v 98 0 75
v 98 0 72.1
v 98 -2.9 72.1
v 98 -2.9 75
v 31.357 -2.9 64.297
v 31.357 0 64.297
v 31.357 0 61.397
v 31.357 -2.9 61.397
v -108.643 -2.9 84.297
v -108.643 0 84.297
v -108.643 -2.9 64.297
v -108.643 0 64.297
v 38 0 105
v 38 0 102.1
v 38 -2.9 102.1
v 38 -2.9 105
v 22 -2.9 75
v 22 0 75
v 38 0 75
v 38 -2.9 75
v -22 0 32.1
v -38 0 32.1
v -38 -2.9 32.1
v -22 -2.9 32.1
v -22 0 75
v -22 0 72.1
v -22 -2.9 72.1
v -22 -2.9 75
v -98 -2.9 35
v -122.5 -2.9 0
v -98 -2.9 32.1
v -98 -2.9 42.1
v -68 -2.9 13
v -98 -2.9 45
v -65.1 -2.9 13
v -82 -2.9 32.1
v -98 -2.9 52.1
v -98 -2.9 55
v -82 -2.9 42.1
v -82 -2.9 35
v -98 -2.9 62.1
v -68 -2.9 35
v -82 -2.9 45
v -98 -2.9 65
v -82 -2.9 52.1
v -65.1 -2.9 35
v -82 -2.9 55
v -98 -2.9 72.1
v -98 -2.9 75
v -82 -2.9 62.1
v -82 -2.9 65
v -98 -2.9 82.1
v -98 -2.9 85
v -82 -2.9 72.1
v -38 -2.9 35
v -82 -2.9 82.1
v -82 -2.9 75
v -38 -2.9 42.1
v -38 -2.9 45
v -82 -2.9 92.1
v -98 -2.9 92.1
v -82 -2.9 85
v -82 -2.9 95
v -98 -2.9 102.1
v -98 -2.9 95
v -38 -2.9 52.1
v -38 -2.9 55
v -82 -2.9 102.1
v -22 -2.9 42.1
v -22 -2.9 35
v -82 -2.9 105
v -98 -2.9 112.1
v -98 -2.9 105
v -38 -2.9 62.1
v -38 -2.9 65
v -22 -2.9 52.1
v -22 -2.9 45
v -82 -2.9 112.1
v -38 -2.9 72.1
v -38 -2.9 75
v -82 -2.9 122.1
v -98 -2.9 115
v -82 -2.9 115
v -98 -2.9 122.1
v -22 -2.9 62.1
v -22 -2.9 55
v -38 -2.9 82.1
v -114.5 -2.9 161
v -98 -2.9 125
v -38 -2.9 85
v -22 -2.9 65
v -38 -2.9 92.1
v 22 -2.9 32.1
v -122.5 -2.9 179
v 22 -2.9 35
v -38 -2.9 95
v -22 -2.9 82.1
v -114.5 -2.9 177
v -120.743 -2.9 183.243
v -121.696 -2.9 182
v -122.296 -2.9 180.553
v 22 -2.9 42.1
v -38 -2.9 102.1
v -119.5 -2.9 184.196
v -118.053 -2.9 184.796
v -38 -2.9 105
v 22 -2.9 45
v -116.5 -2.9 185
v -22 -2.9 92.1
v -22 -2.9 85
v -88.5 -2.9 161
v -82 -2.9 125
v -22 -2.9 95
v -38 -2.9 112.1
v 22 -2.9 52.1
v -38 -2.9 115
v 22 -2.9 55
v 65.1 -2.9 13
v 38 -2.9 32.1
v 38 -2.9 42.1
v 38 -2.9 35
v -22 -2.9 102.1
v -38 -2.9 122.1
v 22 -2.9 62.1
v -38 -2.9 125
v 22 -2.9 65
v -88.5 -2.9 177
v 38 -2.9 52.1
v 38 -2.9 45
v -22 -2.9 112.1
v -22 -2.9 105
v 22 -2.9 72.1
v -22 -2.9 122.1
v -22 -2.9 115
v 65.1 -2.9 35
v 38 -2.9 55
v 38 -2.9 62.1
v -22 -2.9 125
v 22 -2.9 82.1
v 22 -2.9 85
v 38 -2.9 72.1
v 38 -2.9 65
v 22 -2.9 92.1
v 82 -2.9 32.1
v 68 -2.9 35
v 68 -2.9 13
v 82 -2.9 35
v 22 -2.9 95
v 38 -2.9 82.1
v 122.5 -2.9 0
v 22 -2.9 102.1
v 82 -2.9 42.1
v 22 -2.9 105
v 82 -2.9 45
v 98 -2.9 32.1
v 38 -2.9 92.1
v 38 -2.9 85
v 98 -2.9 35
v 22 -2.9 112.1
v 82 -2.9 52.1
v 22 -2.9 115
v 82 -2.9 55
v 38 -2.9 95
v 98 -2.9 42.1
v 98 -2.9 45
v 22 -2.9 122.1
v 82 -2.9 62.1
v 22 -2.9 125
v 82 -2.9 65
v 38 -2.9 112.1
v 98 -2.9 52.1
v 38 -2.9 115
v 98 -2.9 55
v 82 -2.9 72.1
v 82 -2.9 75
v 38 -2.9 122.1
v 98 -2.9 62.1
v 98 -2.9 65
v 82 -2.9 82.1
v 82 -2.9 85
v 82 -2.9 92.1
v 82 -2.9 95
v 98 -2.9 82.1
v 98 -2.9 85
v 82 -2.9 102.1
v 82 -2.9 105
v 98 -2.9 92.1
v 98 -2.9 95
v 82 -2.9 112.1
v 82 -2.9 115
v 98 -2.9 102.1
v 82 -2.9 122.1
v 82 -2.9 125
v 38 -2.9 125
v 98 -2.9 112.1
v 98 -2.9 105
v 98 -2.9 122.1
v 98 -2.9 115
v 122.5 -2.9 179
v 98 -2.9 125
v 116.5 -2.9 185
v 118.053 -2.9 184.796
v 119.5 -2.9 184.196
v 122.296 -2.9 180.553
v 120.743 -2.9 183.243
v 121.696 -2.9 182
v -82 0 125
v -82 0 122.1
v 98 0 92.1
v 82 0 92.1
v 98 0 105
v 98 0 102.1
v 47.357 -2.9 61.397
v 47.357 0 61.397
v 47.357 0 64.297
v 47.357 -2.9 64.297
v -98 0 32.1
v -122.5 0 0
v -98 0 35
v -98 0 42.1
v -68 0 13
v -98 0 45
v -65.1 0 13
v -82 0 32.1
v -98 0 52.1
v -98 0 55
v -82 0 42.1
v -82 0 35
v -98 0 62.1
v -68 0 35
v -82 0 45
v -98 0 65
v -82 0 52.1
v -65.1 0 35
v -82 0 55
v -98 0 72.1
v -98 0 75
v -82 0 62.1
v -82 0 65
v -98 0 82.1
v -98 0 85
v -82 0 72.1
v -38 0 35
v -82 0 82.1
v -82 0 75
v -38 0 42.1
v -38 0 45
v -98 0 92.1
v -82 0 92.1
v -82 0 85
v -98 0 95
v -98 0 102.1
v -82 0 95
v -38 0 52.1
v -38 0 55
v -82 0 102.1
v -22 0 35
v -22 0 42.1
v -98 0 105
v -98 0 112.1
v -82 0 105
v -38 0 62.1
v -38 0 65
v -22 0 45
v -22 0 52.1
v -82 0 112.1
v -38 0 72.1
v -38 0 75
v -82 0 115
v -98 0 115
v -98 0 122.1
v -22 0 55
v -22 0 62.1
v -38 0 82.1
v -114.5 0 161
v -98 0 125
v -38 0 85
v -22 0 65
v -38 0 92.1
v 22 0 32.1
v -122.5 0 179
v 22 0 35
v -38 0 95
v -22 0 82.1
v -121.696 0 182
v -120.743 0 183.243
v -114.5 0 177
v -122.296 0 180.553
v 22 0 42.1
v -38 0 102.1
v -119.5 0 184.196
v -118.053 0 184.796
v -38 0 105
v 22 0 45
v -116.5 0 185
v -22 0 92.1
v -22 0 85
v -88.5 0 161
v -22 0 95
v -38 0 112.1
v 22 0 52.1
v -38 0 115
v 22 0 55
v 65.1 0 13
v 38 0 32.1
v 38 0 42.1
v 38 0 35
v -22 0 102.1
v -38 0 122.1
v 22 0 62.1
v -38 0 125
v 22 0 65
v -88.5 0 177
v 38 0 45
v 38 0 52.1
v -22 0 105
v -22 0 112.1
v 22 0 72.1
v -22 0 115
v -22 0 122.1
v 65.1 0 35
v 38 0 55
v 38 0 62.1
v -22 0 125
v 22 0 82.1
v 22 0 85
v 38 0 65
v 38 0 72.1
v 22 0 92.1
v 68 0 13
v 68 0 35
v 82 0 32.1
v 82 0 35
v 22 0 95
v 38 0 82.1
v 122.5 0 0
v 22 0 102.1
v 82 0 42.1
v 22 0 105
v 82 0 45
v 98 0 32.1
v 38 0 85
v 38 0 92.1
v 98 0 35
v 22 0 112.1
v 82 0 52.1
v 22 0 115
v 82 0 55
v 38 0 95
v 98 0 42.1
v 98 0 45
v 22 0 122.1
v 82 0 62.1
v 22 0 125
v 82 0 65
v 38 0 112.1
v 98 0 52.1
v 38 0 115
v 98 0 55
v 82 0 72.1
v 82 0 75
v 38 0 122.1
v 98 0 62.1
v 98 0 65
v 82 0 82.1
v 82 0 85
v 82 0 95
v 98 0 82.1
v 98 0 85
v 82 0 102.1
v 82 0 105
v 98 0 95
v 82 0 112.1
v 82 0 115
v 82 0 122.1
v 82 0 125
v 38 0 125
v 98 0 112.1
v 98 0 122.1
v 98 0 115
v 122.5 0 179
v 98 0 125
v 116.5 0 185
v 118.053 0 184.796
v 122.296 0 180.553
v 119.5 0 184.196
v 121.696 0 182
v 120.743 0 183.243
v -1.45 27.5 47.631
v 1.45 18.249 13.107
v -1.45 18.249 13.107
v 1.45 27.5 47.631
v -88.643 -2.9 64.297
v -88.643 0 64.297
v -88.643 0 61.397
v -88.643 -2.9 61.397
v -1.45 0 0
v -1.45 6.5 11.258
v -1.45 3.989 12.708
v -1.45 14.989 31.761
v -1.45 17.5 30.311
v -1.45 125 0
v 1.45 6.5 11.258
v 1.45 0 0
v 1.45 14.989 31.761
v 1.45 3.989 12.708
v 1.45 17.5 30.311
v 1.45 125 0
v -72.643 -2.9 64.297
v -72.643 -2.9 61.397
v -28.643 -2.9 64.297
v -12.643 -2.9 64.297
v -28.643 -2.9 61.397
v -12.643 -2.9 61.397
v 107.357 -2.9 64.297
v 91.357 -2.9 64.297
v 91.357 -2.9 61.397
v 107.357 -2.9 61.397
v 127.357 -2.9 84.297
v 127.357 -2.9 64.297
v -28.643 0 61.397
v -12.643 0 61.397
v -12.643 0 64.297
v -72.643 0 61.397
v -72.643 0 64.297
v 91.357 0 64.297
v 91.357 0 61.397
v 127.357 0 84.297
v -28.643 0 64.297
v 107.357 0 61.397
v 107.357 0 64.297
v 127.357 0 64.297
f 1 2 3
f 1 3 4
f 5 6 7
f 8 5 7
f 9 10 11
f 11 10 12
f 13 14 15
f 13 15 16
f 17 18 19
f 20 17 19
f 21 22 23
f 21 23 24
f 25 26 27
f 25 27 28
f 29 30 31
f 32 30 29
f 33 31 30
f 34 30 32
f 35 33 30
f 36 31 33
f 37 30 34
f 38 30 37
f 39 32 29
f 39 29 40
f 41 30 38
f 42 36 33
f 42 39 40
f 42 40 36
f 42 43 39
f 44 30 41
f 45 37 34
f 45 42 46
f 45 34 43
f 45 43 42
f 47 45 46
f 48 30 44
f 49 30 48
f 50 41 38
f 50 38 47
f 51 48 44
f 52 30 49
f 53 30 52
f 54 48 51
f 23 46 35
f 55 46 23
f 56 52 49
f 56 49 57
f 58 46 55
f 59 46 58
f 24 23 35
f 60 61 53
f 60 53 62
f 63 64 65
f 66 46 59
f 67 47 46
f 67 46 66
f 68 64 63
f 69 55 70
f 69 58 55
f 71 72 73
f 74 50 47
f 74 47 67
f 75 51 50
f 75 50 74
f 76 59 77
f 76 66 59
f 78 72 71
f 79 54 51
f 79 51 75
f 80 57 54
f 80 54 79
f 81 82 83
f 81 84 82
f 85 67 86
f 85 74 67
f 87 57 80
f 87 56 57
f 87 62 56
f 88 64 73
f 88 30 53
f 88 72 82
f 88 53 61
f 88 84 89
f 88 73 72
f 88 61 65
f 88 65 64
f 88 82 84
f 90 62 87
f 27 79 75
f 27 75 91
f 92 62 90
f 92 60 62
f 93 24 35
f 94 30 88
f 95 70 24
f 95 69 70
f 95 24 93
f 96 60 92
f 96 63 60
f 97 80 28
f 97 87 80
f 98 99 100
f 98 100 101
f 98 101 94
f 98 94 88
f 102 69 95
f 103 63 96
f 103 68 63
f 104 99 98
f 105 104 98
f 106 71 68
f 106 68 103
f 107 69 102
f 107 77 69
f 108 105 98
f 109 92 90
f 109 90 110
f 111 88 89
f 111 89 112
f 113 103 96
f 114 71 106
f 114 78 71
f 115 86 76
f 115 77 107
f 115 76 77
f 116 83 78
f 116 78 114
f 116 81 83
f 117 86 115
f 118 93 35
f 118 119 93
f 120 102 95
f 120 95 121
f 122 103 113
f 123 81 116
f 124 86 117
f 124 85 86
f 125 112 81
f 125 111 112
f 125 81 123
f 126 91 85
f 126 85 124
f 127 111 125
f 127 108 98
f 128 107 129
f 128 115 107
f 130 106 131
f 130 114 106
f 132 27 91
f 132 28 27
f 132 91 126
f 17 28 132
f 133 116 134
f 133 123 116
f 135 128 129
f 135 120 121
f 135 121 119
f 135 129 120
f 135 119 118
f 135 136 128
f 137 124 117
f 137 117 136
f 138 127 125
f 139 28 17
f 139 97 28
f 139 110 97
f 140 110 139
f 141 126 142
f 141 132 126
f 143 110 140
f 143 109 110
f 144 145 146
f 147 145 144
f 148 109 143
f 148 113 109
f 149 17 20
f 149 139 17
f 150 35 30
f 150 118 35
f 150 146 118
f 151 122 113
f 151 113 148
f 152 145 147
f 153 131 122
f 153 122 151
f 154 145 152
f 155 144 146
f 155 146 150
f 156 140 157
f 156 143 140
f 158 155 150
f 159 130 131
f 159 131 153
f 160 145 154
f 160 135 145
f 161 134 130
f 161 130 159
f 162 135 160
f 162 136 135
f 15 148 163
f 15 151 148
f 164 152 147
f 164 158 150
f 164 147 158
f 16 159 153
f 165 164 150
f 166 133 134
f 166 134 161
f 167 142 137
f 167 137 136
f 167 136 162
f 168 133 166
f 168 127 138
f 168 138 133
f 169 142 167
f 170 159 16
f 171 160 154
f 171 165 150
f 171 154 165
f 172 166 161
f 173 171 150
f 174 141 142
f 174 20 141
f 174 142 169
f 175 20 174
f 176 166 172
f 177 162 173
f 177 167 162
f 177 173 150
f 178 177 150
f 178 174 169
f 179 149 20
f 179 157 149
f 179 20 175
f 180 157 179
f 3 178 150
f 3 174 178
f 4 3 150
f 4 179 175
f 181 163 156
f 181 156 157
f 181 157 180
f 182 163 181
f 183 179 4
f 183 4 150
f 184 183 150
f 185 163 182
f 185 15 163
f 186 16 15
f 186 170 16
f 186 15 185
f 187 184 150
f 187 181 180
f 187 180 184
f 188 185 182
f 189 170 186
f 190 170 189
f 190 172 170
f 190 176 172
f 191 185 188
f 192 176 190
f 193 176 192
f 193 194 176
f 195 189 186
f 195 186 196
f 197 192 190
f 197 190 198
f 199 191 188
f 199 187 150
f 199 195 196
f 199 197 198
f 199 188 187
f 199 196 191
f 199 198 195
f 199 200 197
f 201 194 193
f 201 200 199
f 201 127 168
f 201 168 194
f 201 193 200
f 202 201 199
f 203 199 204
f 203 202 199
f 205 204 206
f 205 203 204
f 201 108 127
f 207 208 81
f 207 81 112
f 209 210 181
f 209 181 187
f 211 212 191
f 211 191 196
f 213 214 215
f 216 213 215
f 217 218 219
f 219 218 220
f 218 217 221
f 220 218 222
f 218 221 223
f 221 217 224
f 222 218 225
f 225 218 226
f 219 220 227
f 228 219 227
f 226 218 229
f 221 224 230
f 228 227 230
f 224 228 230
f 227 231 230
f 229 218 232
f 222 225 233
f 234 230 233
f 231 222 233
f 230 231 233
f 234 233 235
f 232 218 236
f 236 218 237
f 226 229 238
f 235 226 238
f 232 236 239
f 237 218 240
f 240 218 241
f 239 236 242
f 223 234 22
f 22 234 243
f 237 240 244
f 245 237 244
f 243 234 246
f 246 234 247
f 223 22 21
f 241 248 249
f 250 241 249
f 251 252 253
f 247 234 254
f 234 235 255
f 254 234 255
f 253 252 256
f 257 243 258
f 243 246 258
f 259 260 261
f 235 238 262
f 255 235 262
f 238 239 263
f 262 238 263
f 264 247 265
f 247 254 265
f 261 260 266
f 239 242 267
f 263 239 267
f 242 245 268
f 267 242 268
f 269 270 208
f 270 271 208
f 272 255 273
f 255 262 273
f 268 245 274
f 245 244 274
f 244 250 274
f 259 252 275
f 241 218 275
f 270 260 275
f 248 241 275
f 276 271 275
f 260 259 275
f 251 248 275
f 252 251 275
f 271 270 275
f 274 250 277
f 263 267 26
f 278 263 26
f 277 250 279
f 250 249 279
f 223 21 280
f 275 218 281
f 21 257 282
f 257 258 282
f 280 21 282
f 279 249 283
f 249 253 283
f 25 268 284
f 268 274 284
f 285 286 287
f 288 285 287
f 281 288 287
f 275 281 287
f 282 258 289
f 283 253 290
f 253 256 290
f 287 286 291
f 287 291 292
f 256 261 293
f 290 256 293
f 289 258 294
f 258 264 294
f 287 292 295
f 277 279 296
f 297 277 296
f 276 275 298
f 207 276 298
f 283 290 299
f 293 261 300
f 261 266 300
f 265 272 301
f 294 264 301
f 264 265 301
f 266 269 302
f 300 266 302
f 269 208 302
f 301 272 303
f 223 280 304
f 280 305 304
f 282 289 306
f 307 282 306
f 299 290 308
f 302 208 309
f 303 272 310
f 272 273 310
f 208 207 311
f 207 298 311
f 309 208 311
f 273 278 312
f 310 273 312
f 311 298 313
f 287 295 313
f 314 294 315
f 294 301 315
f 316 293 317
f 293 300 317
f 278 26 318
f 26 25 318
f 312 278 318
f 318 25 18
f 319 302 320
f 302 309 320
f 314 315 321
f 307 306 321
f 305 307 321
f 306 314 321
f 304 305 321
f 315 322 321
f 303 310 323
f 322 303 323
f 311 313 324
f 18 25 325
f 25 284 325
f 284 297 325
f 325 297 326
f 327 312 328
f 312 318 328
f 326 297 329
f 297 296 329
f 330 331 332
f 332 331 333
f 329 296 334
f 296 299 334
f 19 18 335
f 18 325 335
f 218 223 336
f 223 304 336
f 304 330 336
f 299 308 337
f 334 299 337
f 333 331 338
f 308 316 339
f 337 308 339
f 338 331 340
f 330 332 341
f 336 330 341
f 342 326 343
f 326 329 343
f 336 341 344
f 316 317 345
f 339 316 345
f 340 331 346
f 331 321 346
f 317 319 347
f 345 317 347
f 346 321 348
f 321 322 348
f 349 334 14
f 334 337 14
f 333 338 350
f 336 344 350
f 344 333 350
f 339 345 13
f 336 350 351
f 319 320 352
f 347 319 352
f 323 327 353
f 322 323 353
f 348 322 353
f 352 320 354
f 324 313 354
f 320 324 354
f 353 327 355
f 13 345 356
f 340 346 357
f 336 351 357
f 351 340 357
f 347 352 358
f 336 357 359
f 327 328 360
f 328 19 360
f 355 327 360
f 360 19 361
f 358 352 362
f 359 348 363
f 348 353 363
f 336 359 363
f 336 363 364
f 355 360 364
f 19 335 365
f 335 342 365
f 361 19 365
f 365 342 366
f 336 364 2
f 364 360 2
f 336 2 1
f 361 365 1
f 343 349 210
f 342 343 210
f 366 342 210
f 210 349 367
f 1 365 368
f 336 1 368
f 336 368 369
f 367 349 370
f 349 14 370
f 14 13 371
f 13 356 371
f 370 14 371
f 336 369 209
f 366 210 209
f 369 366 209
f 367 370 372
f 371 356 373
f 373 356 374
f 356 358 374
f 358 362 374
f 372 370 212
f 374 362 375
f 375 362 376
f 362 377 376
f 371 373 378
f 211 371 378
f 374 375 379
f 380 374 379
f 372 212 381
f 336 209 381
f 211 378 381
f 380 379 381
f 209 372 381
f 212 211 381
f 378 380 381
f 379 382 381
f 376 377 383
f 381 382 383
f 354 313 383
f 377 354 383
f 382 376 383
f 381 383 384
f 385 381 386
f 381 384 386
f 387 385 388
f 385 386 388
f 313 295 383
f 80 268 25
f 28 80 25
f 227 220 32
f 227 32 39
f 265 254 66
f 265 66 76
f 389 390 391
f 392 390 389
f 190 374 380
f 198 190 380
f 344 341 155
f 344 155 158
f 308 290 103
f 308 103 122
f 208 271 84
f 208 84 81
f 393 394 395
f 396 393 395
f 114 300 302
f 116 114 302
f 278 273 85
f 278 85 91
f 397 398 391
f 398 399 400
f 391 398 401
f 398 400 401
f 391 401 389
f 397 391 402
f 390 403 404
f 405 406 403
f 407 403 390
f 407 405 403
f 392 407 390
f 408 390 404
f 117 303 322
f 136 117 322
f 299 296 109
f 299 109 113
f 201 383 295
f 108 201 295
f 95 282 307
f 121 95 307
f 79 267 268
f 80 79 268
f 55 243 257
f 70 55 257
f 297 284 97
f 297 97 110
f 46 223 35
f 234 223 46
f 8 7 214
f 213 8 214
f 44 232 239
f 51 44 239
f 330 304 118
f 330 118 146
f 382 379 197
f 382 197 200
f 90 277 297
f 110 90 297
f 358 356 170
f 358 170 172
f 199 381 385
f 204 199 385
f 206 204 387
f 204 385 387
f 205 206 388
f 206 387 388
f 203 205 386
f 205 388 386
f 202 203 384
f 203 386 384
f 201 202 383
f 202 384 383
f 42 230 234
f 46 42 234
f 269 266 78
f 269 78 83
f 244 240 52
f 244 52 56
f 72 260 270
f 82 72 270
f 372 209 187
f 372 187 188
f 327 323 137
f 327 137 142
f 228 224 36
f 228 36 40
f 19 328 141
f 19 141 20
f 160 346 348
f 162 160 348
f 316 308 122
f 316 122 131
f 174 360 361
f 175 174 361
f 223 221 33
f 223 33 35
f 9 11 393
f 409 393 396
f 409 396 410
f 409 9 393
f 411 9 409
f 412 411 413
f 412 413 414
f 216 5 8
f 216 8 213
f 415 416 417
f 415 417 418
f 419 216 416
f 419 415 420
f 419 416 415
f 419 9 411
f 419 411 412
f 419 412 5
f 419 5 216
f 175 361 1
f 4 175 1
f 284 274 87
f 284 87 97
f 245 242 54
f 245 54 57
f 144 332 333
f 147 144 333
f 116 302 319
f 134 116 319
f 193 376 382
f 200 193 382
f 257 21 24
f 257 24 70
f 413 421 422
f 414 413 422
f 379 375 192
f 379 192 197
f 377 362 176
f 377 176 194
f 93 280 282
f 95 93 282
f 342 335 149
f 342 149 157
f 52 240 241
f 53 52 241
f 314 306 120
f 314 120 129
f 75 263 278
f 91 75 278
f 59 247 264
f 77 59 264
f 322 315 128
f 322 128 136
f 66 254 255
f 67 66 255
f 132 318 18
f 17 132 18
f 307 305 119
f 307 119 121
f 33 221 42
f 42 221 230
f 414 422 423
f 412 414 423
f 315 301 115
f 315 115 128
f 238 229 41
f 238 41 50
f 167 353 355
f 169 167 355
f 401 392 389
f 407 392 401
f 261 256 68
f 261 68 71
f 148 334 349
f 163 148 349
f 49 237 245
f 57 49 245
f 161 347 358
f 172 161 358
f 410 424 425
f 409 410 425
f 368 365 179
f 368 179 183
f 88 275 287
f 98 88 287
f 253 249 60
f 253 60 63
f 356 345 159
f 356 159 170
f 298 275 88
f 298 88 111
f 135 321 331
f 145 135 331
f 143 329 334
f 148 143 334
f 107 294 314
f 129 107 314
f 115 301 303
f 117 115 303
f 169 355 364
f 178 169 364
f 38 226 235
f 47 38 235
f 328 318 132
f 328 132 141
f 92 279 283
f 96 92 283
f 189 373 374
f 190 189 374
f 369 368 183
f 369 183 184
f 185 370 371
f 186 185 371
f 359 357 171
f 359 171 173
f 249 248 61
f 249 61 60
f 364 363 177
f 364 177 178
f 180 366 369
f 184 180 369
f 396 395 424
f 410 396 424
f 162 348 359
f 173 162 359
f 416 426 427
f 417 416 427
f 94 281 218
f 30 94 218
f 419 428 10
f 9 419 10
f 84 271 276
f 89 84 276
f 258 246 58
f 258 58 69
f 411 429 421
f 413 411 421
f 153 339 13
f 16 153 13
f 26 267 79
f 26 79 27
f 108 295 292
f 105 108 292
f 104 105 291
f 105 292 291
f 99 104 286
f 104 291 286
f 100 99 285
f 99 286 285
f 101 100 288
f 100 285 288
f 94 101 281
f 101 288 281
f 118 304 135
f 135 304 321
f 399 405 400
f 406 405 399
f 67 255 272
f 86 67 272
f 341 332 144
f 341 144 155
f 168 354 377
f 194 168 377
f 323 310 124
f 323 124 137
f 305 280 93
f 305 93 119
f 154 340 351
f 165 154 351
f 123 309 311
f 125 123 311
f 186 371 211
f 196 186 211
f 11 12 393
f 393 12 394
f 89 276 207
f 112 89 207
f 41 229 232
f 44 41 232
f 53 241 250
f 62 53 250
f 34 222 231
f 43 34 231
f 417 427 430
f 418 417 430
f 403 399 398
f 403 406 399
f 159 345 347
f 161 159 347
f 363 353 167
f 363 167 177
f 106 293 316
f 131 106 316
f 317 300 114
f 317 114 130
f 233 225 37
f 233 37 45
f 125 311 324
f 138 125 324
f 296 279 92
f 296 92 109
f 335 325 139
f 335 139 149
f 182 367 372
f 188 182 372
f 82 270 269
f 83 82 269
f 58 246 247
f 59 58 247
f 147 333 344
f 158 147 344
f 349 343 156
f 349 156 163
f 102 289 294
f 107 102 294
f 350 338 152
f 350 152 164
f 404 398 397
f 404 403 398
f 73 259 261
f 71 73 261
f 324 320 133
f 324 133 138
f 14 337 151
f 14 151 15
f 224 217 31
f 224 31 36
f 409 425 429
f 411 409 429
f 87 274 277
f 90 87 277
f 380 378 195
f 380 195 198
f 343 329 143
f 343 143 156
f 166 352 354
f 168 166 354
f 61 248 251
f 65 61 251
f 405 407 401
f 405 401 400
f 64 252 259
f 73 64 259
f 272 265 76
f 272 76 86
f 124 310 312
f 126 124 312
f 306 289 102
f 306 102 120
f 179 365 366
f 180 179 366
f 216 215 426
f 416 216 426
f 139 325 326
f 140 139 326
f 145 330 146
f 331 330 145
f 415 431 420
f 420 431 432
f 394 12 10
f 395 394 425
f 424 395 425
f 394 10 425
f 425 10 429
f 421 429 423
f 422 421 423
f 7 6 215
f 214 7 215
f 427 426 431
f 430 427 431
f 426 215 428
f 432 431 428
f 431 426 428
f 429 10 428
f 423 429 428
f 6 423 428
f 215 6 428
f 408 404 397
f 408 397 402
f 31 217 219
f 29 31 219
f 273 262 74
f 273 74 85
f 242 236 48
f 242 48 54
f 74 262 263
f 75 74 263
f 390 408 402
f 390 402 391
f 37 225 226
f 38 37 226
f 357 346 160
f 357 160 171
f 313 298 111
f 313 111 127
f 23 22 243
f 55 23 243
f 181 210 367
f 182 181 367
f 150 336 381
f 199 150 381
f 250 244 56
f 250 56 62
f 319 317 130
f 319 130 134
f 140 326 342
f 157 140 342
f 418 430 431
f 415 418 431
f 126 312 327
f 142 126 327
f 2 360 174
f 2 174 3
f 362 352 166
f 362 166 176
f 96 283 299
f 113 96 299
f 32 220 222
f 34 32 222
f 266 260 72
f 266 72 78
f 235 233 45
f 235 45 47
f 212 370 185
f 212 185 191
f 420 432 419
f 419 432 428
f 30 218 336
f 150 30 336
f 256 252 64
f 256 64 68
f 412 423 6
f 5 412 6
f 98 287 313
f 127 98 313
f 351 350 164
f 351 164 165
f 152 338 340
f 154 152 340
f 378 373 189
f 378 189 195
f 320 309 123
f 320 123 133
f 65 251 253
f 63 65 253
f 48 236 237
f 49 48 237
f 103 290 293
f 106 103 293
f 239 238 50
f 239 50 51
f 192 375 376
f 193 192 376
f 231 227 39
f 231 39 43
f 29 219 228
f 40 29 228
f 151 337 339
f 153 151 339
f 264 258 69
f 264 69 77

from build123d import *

# Parameters (mm, degrees)
F0_W     = 16
F0_H     = 2.9
F0_W_2   = 2.9
F0_H_2   = 22
F0_W_3   = 26
F0_H_3   = 16
F1_DEPTH = 2.9
F3_DEPTH = 1.45
F5_DEPTH = 2.9


# Not quite as in the source:
# - a feature names something its author has since deleted; it is built from what else it names


with BuildPart() as f1:
    # F0 (on Front) → F1 (new body)
    with BuildSketch(Plane.XZ):
        with BuildLine():
            Line((116.5, 185), (-116.5, 185))
            ThreePointArc((-116.5, 185), (-120.7426406871, 183.2426406871), (-122.5, 179))
            Line((-122.5, 179), (-122.5, 0))
            Line((-122.5, 0), (122.5, 0))
            Line((122.5, 0), (122.5, 179))
            ThreePointArc((122.5, 179), (120.7426406871, 183.2426406871), (116.5, 185))
        make_face()
        with Locations((-90, 33.55)):
            Rectangle(F0_W, F0_H, mode=Mode.SUBTRACT)
        with Locations((-66.55, 24)):
            Rectangle(F0_W_2, F0_H_2, mode=Mode.SUBTRACT)
        with Locations((-90, 43.55)):
            Rectangle(F0_W, F0_H, mode=Mode.SUBTRACT)
        with Locations((-30, 33.55)):
            Rectangle(F0_W, F0_H, mode=Mode.SUBTRACT)
        with Locations((-30, 43.55)):
            Rectangle(F0_W, F0_H, mode=Mode.SUBTRACT)
        with Locations((-90, 53.55)):
            Rectangle(F0_W, F0_H, mode=Mode.SUBTRACT)
        with Locations((-90, 63.55)):
            Rectangle(F0_W, F0_H, mode=Mode.SUBTRACT)
        with Locations((-90, 73.55)):
            Rectangle(F0_W, F0_H, mode=Mode.SUBTRACT)
        with Locations((-90, 83.55)):
            Rectangle(F0_W, F0_H, mode=Mode.SUBTRACT)
        with Locations((-30, 53.55)):
            Rectangle(F0_W, F0_H, mode=Mode.SUBTRACT)
        with Locations((-30, 63.55)):
            Rectangle(F0_W, F0_H, mode=Mode.SUBTRACT)
        with Locations((-30, 73.55)):
            Rectangle(F0_W, F0_H, mode=Mode.SUBTRACT)
        with Locations((-30, 83.55)):
            Rectangle(F0_W, F0_H, mode=Mode.SUBTRACT)
        with Locations((30, 33.55)):
            Rectangle(F0_W, F0_H, mode=Mode.SUBTRACT)
        with Locations((30, 43.55)):
            Rectangle(F0_W, F0_H, mode=Mode.SUBTRACT)
        with Locations((66.55, 24)):
            Rectangle(F0_W_2, F0_H_2, mode=Mode.SUBTRACT)
        with Locations((90, 33.55)):
            Rectangle(F0_W, F0_H, mode=Mode.SUBTRACT)
        with Locations((90, 43.55)):
            Rectangle(F0_W, F0_H, mode=Mode.SUBTRACT)
        with Locations((30, 53.55)):
            Rectangle(F0_W, F0_H, mode=Mode.SUBTRACT)
        with Locations((30, 63.55)):
            Rectangle(F0_W, F0_H, mode=Mode.SUBTRACT)
        with Locations((30, 73.55)):
            Rectangle(F0_W, F0_H, mode=Mode.SUBTRACT)
        with Locations((30, 83.55)):
            Rectangle(F0_W, F0_H, mode=Mode.SUBTRACT)
        with Locations((90, 53.55)):
            Rectangle(F0_W, F0_H, mode=Mode.SUBTRACT)
        with Locations((90, 63.55)):
            Rectangle(F0_W, F0_H, mode=Mode.SUBTRACT)
        with Locations((90, 73.55)):
            Rectangle(F0_W, F0_H, mode=Mode.SUBTRACT)
        with Locations((90, 83.55)):
            Rectangle(F0_W, F0_H, mode=Mode.SUBTRACT)
        with Locations((-90, 93.55)):
            Rectangle(F0_W, F0_H, mode=Mode.SUBTRACT)
        with Locations((-90, 103.55)):
            Rectangle(F0_W, F0_H, mode=Mode.SUBTRACT)
        with Locations((-90, 113.55)):
            Rectangle(F0_W, F0_H, mode=Mode.SUBTRACT)
        with Locations((-90, 123.55)):
            Rectangle(F0_W, F0_H, mode=Mode.SUBTRACT)
        with Locations((-30, 93.55)):
            Rectangle(F0_W, F0_H, mode=Mode.SUBTRACT)
        with Locations((-30, 103.55)):
            Rectangle(F0_W, F0_H, mode=Mode.SUBTRACT)
        with Locations((-30, 113.55)):
            Rectangle(F0_W, F0_H, mode=Mode.SUBTRACT)
        with Locations((-30, 123.55)):
            Rectangle(F0_W, F0_H, mode=Mode.SUBTRACT)
        with Locations((-101.5, 169)):
            Rectangle(F0_W_3, F0_H_3, mode=Mode.SUBTRACT)
        with Locations((30, 93.55)):
            Rectangle(F0_W, F0_H, mode=Mode.SUBTRACT)
        with Locations((30, 103.55)):
            Rectangle(F0_W, F0_H, mode=Mode.SUBTRACT)
        with Locations((30, 113.55)):
            Rectangle(F0_W, F0_H, mode=Mode.SUBTRACT)
        with Locations((30, 123.55)):
            Rectangle(F0_W, F0_H, mode=Mode.SUBTRACT)
        with Locations((90, 93.55)):
            Rectangle(F0_W, F0_H, mode=Mode.SUBTRACT)
        with Locations((90, 103.55)):
            Rectangle(F0_W, F0_H, mode=Mode.SUBTRACT)
        with Locations((90, 113.55)):
            Rectangle(F0_W, F0_H, mode=Mode.SUBTRACT)
        with Locations((90, 123.55)):
            Rectangle(F0_W, F0_H, mode=Mode.SUBTRACT)
    extrude(amount=F1_DEPTH)


with BuildPart() as f3:
    # F2 (on Right) → F3 (new body, symmetric)
    with BuildSketch(Plane.YZ):
        Polygon((6.5, 11.2583302492), (0, 0), (125, 0), (18.2493059725, 13.1073370922), (27.5, 47.6313972081), (17.5, 30.3108891325), (14.988526329, 31.7608891325), (3.988526329, 12.7083302492), align=None)
    extrude(amount=F3_DEPTH, both=True)


with BuildPart() as f5:
    # F4 (on Front) → F5 (new body)
    with BuildSketch(Plane.XZ):
        Polygon((-108.6425621135, 84.2970302286), (-108.6425621135, 64.2970302286), (-88.6425621135, 64.2970302286), (-88.6425621135, 61.3970302286), (-72.6425621135, 61.3970302286), (-72.6425621135, 64.2970302286), (-28.6425621135, 64.2970302286), (-28.6425621135, 61.3970302286), (-12.6425621135, 61.3970302286), (-12.6425621135, 64.2970302286), (31.3574378865, 64.2970302286), (31.3574378865, 61.3970302286), (47.3574378865, 61.3970302286), (47.3574378865, 64.2970302286), (91.3574378865, 64.2970302286), (91.3574378865, 61.3970302286), (107.3574378865, 61.3970302286), (107.3574378865, 64.2970302286), (127.3574378865, 64.2970302286), (127.3574378865, 84.2970302286), align=None)
    extrude(amount=F5_DEPTH)


solid = Compound([f1.part, f3.part, f5.part])
